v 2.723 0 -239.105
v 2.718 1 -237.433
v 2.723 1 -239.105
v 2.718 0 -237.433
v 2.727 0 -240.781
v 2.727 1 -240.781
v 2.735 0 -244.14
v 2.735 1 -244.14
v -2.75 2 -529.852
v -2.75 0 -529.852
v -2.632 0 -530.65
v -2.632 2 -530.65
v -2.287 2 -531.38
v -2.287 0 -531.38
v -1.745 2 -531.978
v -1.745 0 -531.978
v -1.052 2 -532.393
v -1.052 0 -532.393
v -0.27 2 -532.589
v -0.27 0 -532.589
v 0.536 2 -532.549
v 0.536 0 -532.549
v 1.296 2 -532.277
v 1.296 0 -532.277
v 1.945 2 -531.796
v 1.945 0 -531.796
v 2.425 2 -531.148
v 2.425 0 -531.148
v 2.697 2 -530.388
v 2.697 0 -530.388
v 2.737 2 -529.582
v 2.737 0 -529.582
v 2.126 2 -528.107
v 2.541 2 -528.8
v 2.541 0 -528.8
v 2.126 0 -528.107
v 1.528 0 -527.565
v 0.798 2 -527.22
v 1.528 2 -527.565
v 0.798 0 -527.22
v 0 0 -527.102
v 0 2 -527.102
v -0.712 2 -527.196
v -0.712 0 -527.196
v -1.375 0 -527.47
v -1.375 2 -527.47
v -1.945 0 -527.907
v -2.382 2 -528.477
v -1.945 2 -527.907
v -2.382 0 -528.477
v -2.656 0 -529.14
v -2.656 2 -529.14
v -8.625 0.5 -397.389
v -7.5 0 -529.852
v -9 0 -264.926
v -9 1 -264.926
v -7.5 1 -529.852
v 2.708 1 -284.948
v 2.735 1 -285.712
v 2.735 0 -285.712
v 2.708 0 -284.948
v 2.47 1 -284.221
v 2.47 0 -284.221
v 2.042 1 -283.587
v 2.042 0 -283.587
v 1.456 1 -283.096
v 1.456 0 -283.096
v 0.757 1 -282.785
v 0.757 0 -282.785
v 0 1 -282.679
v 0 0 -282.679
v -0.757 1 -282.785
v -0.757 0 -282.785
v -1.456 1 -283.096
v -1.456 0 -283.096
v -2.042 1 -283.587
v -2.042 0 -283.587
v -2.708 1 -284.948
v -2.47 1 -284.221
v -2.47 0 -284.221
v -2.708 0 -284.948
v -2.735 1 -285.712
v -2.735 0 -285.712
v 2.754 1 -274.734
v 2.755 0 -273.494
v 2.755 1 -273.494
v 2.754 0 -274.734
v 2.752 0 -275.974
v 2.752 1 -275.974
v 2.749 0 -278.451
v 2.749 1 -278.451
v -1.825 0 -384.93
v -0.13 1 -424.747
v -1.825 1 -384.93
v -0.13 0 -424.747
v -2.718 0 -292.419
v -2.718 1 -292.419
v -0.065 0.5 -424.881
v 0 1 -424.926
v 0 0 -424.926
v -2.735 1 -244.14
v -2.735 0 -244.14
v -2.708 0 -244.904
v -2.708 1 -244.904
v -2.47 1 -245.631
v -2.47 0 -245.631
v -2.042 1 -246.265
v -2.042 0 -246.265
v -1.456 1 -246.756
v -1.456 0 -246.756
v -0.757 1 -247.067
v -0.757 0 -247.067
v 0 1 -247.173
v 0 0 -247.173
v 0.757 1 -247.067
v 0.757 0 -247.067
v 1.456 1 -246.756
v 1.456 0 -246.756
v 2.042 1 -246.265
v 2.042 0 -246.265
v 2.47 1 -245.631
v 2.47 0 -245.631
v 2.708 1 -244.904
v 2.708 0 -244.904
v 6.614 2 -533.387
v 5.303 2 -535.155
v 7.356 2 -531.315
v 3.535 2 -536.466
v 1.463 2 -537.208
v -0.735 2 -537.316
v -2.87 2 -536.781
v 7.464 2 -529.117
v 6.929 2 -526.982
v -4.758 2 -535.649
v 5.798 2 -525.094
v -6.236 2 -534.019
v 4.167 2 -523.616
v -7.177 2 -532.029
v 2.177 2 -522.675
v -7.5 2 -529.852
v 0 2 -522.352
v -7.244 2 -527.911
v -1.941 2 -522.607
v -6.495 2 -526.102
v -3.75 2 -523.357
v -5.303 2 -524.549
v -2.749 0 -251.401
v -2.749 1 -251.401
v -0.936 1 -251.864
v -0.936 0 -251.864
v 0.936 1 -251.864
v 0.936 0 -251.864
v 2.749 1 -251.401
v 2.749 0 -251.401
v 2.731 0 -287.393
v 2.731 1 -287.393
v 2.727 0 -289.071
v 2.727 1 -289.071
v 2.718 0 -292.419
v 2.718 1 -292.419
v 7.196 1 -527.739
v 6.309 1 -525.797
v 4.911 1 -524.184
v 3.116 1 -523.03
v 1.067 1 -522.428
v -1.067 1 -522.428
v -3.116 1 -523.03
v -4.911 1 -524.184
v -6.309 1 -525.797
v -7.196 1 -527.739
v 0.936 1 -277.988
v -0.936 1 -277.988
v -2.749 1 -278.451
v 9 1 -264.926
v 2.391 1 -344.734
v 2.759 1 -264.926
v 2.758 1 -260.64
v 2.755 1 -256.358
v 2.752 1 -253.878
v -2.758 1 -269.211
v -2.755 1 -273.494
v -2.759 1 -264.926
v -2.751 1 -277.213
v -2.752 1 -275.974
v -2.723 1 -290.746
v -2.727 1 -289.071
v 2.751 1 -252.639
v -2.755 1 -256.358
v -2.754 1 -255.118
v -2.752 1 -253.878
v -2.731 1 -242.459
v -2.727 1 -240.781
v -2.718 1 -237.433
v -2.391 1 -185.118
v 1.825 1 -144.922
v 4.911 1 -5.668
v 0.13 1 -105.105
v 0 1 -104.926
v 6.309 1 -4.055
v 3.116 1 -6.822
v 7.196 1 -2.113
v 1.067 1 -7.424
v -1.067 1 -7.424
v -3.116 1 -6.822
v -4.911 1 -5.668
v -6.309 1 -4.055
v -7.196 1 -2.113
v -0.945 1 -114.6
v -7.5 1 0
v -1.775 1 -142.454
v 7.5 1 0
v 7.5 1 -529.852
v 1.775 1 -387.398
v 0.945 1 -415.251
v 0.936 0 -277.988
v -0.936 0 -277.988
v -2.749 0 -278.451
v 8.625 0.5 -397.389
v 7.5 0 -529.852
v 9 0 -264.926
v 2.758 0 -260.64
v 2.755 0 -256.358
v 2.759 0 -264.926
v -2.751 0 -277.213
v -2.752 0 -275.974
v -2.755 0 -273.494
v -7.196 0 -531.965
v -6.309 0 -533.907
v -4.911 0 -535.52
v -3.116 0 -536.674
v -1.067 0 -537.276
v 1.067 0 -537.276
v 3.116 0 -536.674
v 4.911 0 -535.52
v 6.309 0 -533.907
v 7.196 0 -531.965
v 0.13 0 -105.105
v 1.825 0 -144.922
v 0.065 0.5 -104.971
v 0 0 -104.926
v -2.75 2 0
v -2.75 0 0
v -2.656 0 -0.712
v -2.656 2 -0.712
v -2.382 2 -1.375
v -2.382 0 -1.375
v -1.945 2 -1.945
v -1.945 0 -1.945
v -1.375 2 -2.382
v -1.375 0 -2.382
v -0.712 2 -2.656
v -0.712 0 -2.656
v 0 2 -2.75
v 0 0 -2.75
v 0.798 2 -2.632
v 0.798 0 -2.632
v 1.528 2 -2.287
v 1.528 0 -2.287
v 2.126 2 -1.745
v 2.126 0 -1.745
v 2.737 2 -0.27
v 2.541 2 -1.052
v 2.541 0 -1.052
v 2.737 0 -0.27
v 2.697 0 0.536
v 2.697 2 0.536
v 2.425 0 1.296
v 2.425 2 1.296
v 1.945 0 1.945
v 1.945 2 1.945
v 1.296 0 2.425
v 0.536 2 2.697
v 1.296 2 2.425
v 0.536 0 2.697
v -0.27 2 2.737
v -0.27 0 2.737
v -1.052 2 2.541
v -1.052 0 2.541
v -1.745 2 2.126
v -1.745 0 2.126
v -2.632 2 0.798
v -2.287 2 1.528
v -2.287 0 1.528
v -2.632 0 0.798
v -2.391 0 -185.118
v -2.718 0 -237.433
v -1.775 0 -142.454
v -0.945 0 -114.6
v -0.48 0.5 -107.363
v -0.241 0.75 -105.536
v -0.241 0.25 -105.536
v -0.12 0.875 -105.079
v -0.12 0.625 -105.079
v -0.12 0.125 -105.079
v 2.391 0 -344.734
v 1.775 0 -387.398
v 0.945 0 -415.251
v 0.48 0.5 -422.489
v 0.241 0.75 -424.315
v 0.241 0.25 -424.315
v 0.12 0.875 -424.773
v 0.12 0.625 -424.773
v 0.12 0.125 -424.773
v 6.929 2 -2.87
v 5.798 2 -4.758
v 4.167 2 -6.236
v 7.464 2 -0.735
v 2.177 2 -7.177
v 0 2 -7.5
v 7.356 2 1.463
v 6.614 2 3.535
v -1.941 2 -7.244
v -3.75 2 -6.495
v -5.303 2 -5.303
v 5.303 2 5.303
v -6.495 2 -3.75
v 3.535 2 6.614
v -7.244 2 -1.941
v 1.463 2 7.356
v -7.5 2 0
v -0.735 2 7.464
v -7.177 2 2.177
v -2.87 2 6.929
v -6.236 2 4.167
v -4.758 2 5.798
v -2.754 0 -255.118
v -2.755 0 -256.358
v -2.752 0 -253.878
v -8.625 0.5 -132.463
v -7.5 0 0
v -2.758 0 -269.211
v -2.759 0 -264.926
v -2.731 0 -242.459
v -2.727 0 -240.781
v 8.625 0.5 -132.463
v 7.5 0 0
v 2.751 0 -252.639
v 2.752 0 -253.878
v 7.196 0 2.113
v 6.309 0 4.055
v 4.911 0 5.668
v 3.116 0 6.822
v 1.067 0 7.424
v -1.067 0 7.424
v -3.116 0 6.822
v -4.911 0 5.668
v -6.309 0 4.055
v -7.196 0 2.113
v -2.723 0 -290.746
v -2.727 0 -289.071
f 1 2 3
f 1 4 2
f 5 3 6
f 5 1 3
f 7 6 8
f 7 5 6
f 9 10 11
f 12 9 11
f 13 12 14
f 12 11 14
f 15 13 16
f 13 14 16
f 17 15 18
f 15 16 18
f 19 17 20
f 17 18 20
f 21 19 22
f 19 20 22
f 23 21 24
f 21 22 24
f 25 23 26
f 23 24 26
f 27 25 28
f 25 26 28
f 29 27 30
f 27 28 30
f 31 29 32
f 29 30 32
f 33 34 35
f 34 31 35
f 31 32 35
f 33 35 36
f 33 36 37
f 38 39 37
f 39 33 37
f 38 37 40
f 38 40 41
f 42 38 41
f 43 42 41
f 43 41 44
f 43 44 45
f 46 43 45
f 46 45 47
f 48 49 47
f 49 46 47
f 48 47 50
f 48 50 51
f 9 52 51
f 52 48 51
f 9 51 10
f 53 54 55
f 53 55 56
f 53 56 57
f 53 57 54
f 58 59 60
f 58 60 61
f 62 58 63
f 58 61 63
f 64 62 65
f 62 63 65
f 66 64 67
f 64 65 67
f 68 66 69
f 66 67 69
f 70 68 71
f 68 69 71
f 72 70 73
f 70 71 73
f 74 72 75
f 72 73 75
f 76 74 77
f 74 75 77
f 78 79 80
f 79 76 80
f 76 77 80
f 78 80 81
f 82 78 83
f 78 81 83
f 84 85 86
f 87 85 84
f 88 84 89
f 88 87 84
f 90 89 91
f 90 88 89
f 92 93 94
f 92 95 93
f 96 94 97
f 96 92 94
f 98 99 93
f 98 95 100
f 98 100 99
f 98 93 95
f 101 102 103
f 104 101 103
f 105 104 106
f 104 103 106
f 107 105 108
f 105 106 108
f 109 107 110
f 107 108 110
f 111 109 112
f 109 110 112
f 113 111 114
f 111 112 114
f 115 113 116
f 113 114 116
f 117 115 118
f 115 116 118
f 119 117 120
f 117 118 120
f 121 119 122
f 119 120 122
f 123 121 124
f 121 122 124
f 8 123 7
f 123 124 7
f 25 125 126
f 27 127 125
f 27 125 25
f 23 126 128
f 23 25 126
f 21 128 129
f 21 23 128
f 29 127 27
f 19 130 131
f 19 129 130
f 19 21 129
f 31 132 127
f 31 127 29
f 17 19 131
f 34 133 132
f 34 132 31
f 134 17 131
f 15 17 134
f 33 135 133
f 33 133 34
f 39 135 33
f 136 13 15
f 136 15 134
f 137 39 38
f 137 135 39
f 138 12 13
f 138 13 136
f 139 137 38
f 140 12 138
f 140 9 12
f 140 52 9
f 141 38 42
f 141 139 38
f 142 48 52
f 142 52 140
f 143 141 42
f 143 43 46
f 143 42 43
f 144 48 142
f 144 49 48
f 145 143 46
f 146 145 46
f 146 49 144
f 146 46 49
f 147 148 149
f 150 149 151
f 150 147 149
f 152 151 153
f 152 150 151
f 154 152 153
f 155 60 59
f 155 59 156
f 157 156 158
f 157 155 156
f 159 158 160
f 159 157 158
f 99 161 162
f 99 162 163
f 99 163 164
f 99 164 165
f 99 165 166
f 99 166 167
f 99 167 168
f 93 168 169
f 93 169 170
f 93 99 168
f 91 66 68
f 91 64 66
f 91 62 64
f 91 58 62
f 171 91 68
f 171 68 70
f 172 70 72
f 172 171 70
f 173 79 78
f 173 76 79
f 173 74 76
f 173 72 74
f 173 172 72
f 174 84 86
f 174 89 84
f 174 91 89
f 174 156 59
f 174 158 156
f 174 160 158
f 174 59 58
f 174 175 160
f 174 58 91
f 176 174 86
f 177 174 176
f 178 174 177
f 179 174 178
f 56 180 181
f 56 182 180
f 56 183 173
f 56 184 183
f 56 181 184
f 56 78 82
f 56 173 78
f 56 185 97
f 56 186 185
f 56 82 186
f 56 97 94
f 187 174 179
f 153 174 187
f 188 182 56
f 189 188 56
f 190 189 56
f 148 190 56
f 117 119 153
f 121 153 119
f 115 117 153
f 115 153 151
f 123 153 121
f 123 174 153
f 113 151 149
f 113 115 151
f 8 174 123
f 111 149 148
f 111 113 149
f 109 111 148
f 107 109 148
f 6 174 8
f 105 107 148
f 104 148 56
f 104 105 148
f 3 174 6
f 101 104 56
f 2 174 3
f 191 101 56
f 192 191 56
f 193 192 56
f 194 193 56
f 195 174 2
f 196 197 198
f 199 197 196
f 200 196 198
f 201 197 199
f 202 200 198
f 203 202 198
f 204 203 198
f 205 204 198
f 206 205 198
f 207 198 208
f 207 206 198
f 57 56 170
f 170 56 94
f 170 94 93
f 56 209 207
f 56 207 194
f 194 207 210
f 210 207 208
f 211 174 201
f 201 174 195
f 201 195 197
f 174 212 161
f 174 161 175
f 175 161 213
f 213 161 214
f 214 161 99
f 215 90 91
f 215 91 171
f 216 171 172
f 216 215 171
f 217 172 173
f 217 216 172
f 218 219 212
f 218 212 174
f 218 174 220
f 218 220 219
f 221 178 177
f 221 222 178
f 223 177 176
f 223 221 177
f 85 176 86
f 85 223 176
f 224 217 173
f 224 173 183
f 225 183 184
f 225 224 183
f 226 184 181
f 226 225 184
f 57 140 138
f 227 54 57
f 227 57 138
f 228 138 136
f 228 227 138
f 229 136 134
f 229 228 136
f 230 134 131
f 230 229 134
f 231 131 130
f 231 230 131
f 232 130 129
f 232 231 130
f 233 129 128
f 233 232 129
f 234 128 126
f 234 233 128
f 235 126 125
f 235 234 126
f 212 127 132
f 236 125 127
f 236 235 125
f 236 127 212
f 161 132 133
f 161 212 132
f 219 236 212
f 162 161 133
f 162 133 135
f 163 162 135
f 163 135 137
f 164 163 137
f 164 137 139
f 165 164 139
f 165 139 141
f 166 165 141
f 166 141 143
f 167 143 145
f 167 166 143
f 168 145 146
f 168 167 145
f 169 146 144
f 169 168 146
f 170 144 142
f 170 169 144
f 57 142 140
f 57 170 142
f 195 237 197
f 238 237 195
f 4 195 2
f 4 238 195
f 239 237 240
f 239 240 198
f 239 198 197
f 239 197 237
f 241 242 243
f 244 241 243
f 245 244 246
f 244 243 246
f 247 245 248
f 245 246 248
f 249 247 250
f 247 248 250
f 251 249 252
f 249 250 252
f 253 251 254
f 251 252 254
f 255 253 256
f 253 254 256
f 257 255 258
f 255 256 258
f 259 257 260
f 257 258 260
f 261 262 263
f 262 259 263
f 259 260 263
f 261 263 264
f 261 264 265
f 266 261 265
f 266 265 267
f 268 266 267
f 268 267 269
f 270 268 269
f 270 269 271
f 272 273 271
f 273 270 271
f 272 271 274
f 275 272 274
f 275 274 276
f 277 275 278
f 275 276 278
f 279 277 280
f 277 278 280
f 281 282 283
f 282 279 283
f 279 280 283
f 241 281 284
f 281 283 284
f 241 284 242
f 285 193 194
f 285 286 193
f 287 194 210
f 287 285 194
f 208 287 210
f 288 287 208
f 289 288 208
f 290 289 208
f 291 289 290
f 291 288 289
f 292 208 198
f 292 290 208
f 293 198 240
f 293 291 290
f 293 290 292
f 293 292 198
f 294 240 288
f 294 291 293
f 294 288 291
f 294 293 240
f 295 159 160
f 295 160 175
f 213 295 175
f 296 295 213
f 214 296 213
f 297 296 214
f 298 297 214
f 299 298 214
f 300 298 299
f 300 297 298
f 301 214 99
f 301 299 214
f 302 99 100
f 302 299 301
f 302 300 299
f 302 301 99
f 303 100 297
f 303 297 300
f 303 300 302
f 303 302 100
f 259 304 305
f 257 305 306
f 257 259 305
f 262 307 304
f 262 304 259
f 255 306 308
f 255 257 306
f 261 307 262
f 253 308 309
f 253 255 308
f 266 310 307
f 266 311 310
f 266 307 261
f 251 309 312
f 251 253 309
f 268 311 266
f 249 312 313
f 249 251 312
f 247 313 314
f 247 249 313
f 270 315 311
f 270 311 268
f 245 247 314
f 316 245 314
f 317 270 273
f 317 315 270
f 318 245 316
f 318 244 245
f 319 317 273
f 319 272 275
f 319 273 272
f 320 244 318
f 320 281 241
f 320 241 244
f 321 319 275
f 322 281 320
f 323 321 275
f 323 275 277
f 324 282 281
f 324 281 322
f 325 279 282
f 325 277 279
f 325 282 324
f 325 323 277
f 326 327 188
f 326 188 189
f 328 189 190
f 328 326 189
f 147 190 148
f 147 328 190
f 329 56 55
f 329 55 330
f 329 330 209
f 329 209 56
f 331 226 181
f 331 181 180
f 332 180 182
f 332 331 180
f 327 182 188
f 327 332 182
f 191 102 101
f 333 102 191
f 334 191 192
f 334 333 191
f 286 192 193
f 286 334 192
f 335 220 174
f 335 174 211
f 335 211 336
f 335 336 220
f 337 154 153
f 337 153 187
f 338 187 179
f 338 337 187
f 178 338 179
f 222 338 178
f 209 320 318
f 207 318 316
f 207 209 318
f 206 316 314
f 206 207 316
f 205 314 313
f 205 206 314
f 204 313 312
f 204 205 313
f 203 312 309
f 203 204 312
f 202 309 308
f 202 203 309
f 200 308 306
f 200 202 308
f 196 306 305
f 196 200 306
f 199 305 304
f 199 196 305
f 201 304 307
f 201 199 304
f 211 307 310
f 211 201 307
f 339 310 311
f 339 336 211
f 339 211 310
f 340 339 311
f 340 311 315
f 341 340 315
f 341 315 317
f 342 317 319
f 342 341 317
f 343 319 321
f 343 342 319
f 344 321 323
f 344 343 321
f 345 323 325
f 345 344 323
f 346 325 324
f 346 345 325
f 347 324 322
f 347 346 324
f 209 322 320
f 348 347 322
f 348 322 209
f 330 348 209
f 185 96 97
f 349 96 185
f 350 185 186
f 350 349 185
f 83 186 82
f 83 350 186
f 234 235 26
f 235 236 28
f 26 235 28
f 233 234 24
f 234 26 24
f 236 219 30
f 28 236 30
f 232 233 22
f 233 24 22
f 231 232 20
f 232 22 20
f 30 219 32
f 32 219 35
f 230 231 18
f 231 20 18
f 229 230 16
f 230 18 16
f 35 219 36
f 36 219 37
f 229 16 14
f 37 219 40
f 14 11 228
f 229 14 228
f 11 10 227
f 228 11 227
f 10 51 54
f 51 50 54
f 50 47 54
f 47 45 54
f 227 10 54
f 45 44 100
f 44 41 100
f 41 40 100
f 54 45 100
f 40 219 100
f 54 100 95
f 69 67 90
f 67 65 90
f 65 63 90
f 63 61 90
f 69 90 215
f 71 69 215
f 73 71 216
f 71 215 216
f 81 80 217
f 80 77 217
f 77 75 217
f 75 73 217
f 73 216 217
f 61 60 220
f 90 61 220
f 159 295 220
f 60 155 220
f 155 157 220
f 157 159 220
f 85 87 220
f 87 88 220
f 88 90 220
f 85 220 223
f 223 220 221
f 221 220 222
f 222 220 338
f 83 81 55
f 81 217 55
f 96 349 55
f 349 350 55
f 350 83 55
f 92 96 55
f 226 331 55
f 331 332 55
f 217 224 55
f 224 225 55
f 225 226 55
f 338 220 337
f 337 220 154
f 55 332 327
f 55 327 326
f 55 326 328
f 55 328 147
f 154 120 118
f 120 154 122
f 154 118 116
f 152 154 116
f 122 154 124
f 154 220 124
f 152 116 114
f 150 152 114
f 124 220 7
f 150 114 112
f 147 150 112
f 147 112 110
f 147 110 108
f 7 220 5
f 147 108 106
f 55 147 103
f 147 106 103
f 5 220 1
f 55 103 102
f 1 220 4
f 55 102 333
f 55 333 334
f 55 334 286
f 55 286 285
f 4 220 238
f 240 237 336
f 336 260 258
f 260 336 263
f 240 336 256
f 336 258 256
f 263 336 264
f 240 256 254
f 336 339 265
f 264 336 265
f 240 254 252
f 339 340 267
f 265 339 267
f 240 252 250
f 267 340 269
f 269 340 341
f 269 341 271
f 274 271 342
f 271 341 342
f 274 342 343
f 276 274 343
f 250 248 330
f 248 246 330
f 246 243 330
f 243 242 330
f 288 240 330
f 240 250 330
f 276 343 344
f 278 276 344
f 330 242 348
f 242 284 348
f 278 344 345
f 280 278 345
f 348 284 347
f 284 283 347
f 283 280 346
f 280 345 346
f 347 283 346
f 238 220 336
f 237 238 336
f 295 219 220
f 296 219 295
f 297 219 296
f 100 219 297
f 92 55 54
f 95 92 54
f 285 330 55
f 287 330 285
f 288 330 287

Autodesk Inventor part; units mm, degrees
ref_plane "YZ Plane" through (0, 0, 0) normal (1, 0, 0) x (0, 1, 0)
ref_plane "XZ Plane" through (0, 0, 0) normal (0, 1, 0) x (-1, 0, 0)
ref_plane "XY Plane" through (0, 0, 0) normal (0, 0, 1) x (1, 0, 0)
sketch "Sketch1" plane through (0, 0, 0) normal (0, 1, 0) x (-1, 0, 0)
  line L0 (0, 0) -> (0, -244.423)
  line L1 (0, 0) -> (244.423, 0) construction
  line L2 (0, -244.423) -> (0, -285.4289)
  line L3 (0, -285.4289) -> (0, -529.8519)
  circle A0 centre (0, -244.423) radius 2.75
  circle A1 centre (0, -285.4289) radius 2.75
  circle A2 centre (0, 0) radius 2.75
  circle A3 centre (0, 0) radius 7.5
  circle A4 centre (0, -529.8519) radius 7.5
  circle A5 centre (0, -264.9259) radius 9
  spline S0 degree 2 poles (7.5, 0) (10.5, -264.9259) (7.5, -529.8519) knots 0 0 0 1 1 1
  spline S1 degree 2 poles (-7.5, -529.8519) (-10.5, -264.9259) (-7.5, 0) knots 0 0 0 1 1 1
  ellipse E0 centre (0, -264.9259) end of major axis (0, -104.9259) minor radius 2.7588
  circle A6 centre (0, -529.8519) radius 2.75
  circle A7 centre (0, -244.423) radius 7.5
  circle A8 centre (0, -285.4289) radius 7.5
  line L4 (7.5, -285.4289) -> (-7.5, -285.4289)
  line L5 (7.5, -244.423) -> (-7.5, -244.423)
  point P0 (9, -264.9259)
  point P1 (-9, -264.9259)
  point P2 (0, -522.3519)
  point P3 (0, -7.5)
  point P4 (-2.7354, -244.1399)
  point P5 (2.7354, -244.1399)
  point P6 (2.7366, -244.694)
  point P7 (2.7548, -256.3579)
  point P8 (-2.7548, -256.3579)
  point P9 (-2.7366, -244.694)
  point P10 (2.7548, -273.494)
  point P11 (2.7366, -285.1579)
  point P12 (2.7354, -285.712)
  point P13 (-2.7354, -285.712)
  point P14 (-2.7366, -285.1579)
  point P15 (-2.7548, -273.494)
  point P16 (2.7489, -278.4508)
  point P17 (-2.7489, -278.4508)
  point P18 (2.7489, -251.4011)
  point P19 (-2.7489, -251.4011)
  dimension "d15" = 160
  dimension "d0" = 244.423
  dimension "d1" = 90
  dimension "d2" = 41.0059
  dimension "d3" = 244.423
  dimension "d4" = 5.5
  dimension "d5" = 5.5
  dimension "d6" = 5.5
  dimension "d7" = 15
  dimension "d8" = 15
  dimension "d9" = 18
  dimension "d10" = 5.5
  dimension "d16" = 15
  dimension "d17" = 15
extrude "Extrusion1" add sketch "Sketch1" along normal blind 2 contours A3 | A4
extrude "Extrusion2" add sketch "Sketch1" along normal blind 1 contours A3 S0 A5 E0 A7 L0 | L0 E0 A7 A5 S1 A3 | E0 A0 L5 A7 | A7 L5 A0 E0 | A5 E0 | A5 E0 A8 L3 A4 S1 | A5 E0 | S0 A4 L3 E0 A8 A5 | L5 A0 E0 A7 | A7 E0 A0 L5 | E0 A1 L4 A8 | A8 L4 A1 E0 | L4 A1 E0 A8 | A8 E0 A1 L4
extrude "Extrusion3" add sketch "Sketch1" along normal blind 1 contours E0 A0 L2 A7 | A7 L2 A0 E0 | A8 L2 A1 E0 | E0 A1 L2 A8
properties part number "szalag3"
